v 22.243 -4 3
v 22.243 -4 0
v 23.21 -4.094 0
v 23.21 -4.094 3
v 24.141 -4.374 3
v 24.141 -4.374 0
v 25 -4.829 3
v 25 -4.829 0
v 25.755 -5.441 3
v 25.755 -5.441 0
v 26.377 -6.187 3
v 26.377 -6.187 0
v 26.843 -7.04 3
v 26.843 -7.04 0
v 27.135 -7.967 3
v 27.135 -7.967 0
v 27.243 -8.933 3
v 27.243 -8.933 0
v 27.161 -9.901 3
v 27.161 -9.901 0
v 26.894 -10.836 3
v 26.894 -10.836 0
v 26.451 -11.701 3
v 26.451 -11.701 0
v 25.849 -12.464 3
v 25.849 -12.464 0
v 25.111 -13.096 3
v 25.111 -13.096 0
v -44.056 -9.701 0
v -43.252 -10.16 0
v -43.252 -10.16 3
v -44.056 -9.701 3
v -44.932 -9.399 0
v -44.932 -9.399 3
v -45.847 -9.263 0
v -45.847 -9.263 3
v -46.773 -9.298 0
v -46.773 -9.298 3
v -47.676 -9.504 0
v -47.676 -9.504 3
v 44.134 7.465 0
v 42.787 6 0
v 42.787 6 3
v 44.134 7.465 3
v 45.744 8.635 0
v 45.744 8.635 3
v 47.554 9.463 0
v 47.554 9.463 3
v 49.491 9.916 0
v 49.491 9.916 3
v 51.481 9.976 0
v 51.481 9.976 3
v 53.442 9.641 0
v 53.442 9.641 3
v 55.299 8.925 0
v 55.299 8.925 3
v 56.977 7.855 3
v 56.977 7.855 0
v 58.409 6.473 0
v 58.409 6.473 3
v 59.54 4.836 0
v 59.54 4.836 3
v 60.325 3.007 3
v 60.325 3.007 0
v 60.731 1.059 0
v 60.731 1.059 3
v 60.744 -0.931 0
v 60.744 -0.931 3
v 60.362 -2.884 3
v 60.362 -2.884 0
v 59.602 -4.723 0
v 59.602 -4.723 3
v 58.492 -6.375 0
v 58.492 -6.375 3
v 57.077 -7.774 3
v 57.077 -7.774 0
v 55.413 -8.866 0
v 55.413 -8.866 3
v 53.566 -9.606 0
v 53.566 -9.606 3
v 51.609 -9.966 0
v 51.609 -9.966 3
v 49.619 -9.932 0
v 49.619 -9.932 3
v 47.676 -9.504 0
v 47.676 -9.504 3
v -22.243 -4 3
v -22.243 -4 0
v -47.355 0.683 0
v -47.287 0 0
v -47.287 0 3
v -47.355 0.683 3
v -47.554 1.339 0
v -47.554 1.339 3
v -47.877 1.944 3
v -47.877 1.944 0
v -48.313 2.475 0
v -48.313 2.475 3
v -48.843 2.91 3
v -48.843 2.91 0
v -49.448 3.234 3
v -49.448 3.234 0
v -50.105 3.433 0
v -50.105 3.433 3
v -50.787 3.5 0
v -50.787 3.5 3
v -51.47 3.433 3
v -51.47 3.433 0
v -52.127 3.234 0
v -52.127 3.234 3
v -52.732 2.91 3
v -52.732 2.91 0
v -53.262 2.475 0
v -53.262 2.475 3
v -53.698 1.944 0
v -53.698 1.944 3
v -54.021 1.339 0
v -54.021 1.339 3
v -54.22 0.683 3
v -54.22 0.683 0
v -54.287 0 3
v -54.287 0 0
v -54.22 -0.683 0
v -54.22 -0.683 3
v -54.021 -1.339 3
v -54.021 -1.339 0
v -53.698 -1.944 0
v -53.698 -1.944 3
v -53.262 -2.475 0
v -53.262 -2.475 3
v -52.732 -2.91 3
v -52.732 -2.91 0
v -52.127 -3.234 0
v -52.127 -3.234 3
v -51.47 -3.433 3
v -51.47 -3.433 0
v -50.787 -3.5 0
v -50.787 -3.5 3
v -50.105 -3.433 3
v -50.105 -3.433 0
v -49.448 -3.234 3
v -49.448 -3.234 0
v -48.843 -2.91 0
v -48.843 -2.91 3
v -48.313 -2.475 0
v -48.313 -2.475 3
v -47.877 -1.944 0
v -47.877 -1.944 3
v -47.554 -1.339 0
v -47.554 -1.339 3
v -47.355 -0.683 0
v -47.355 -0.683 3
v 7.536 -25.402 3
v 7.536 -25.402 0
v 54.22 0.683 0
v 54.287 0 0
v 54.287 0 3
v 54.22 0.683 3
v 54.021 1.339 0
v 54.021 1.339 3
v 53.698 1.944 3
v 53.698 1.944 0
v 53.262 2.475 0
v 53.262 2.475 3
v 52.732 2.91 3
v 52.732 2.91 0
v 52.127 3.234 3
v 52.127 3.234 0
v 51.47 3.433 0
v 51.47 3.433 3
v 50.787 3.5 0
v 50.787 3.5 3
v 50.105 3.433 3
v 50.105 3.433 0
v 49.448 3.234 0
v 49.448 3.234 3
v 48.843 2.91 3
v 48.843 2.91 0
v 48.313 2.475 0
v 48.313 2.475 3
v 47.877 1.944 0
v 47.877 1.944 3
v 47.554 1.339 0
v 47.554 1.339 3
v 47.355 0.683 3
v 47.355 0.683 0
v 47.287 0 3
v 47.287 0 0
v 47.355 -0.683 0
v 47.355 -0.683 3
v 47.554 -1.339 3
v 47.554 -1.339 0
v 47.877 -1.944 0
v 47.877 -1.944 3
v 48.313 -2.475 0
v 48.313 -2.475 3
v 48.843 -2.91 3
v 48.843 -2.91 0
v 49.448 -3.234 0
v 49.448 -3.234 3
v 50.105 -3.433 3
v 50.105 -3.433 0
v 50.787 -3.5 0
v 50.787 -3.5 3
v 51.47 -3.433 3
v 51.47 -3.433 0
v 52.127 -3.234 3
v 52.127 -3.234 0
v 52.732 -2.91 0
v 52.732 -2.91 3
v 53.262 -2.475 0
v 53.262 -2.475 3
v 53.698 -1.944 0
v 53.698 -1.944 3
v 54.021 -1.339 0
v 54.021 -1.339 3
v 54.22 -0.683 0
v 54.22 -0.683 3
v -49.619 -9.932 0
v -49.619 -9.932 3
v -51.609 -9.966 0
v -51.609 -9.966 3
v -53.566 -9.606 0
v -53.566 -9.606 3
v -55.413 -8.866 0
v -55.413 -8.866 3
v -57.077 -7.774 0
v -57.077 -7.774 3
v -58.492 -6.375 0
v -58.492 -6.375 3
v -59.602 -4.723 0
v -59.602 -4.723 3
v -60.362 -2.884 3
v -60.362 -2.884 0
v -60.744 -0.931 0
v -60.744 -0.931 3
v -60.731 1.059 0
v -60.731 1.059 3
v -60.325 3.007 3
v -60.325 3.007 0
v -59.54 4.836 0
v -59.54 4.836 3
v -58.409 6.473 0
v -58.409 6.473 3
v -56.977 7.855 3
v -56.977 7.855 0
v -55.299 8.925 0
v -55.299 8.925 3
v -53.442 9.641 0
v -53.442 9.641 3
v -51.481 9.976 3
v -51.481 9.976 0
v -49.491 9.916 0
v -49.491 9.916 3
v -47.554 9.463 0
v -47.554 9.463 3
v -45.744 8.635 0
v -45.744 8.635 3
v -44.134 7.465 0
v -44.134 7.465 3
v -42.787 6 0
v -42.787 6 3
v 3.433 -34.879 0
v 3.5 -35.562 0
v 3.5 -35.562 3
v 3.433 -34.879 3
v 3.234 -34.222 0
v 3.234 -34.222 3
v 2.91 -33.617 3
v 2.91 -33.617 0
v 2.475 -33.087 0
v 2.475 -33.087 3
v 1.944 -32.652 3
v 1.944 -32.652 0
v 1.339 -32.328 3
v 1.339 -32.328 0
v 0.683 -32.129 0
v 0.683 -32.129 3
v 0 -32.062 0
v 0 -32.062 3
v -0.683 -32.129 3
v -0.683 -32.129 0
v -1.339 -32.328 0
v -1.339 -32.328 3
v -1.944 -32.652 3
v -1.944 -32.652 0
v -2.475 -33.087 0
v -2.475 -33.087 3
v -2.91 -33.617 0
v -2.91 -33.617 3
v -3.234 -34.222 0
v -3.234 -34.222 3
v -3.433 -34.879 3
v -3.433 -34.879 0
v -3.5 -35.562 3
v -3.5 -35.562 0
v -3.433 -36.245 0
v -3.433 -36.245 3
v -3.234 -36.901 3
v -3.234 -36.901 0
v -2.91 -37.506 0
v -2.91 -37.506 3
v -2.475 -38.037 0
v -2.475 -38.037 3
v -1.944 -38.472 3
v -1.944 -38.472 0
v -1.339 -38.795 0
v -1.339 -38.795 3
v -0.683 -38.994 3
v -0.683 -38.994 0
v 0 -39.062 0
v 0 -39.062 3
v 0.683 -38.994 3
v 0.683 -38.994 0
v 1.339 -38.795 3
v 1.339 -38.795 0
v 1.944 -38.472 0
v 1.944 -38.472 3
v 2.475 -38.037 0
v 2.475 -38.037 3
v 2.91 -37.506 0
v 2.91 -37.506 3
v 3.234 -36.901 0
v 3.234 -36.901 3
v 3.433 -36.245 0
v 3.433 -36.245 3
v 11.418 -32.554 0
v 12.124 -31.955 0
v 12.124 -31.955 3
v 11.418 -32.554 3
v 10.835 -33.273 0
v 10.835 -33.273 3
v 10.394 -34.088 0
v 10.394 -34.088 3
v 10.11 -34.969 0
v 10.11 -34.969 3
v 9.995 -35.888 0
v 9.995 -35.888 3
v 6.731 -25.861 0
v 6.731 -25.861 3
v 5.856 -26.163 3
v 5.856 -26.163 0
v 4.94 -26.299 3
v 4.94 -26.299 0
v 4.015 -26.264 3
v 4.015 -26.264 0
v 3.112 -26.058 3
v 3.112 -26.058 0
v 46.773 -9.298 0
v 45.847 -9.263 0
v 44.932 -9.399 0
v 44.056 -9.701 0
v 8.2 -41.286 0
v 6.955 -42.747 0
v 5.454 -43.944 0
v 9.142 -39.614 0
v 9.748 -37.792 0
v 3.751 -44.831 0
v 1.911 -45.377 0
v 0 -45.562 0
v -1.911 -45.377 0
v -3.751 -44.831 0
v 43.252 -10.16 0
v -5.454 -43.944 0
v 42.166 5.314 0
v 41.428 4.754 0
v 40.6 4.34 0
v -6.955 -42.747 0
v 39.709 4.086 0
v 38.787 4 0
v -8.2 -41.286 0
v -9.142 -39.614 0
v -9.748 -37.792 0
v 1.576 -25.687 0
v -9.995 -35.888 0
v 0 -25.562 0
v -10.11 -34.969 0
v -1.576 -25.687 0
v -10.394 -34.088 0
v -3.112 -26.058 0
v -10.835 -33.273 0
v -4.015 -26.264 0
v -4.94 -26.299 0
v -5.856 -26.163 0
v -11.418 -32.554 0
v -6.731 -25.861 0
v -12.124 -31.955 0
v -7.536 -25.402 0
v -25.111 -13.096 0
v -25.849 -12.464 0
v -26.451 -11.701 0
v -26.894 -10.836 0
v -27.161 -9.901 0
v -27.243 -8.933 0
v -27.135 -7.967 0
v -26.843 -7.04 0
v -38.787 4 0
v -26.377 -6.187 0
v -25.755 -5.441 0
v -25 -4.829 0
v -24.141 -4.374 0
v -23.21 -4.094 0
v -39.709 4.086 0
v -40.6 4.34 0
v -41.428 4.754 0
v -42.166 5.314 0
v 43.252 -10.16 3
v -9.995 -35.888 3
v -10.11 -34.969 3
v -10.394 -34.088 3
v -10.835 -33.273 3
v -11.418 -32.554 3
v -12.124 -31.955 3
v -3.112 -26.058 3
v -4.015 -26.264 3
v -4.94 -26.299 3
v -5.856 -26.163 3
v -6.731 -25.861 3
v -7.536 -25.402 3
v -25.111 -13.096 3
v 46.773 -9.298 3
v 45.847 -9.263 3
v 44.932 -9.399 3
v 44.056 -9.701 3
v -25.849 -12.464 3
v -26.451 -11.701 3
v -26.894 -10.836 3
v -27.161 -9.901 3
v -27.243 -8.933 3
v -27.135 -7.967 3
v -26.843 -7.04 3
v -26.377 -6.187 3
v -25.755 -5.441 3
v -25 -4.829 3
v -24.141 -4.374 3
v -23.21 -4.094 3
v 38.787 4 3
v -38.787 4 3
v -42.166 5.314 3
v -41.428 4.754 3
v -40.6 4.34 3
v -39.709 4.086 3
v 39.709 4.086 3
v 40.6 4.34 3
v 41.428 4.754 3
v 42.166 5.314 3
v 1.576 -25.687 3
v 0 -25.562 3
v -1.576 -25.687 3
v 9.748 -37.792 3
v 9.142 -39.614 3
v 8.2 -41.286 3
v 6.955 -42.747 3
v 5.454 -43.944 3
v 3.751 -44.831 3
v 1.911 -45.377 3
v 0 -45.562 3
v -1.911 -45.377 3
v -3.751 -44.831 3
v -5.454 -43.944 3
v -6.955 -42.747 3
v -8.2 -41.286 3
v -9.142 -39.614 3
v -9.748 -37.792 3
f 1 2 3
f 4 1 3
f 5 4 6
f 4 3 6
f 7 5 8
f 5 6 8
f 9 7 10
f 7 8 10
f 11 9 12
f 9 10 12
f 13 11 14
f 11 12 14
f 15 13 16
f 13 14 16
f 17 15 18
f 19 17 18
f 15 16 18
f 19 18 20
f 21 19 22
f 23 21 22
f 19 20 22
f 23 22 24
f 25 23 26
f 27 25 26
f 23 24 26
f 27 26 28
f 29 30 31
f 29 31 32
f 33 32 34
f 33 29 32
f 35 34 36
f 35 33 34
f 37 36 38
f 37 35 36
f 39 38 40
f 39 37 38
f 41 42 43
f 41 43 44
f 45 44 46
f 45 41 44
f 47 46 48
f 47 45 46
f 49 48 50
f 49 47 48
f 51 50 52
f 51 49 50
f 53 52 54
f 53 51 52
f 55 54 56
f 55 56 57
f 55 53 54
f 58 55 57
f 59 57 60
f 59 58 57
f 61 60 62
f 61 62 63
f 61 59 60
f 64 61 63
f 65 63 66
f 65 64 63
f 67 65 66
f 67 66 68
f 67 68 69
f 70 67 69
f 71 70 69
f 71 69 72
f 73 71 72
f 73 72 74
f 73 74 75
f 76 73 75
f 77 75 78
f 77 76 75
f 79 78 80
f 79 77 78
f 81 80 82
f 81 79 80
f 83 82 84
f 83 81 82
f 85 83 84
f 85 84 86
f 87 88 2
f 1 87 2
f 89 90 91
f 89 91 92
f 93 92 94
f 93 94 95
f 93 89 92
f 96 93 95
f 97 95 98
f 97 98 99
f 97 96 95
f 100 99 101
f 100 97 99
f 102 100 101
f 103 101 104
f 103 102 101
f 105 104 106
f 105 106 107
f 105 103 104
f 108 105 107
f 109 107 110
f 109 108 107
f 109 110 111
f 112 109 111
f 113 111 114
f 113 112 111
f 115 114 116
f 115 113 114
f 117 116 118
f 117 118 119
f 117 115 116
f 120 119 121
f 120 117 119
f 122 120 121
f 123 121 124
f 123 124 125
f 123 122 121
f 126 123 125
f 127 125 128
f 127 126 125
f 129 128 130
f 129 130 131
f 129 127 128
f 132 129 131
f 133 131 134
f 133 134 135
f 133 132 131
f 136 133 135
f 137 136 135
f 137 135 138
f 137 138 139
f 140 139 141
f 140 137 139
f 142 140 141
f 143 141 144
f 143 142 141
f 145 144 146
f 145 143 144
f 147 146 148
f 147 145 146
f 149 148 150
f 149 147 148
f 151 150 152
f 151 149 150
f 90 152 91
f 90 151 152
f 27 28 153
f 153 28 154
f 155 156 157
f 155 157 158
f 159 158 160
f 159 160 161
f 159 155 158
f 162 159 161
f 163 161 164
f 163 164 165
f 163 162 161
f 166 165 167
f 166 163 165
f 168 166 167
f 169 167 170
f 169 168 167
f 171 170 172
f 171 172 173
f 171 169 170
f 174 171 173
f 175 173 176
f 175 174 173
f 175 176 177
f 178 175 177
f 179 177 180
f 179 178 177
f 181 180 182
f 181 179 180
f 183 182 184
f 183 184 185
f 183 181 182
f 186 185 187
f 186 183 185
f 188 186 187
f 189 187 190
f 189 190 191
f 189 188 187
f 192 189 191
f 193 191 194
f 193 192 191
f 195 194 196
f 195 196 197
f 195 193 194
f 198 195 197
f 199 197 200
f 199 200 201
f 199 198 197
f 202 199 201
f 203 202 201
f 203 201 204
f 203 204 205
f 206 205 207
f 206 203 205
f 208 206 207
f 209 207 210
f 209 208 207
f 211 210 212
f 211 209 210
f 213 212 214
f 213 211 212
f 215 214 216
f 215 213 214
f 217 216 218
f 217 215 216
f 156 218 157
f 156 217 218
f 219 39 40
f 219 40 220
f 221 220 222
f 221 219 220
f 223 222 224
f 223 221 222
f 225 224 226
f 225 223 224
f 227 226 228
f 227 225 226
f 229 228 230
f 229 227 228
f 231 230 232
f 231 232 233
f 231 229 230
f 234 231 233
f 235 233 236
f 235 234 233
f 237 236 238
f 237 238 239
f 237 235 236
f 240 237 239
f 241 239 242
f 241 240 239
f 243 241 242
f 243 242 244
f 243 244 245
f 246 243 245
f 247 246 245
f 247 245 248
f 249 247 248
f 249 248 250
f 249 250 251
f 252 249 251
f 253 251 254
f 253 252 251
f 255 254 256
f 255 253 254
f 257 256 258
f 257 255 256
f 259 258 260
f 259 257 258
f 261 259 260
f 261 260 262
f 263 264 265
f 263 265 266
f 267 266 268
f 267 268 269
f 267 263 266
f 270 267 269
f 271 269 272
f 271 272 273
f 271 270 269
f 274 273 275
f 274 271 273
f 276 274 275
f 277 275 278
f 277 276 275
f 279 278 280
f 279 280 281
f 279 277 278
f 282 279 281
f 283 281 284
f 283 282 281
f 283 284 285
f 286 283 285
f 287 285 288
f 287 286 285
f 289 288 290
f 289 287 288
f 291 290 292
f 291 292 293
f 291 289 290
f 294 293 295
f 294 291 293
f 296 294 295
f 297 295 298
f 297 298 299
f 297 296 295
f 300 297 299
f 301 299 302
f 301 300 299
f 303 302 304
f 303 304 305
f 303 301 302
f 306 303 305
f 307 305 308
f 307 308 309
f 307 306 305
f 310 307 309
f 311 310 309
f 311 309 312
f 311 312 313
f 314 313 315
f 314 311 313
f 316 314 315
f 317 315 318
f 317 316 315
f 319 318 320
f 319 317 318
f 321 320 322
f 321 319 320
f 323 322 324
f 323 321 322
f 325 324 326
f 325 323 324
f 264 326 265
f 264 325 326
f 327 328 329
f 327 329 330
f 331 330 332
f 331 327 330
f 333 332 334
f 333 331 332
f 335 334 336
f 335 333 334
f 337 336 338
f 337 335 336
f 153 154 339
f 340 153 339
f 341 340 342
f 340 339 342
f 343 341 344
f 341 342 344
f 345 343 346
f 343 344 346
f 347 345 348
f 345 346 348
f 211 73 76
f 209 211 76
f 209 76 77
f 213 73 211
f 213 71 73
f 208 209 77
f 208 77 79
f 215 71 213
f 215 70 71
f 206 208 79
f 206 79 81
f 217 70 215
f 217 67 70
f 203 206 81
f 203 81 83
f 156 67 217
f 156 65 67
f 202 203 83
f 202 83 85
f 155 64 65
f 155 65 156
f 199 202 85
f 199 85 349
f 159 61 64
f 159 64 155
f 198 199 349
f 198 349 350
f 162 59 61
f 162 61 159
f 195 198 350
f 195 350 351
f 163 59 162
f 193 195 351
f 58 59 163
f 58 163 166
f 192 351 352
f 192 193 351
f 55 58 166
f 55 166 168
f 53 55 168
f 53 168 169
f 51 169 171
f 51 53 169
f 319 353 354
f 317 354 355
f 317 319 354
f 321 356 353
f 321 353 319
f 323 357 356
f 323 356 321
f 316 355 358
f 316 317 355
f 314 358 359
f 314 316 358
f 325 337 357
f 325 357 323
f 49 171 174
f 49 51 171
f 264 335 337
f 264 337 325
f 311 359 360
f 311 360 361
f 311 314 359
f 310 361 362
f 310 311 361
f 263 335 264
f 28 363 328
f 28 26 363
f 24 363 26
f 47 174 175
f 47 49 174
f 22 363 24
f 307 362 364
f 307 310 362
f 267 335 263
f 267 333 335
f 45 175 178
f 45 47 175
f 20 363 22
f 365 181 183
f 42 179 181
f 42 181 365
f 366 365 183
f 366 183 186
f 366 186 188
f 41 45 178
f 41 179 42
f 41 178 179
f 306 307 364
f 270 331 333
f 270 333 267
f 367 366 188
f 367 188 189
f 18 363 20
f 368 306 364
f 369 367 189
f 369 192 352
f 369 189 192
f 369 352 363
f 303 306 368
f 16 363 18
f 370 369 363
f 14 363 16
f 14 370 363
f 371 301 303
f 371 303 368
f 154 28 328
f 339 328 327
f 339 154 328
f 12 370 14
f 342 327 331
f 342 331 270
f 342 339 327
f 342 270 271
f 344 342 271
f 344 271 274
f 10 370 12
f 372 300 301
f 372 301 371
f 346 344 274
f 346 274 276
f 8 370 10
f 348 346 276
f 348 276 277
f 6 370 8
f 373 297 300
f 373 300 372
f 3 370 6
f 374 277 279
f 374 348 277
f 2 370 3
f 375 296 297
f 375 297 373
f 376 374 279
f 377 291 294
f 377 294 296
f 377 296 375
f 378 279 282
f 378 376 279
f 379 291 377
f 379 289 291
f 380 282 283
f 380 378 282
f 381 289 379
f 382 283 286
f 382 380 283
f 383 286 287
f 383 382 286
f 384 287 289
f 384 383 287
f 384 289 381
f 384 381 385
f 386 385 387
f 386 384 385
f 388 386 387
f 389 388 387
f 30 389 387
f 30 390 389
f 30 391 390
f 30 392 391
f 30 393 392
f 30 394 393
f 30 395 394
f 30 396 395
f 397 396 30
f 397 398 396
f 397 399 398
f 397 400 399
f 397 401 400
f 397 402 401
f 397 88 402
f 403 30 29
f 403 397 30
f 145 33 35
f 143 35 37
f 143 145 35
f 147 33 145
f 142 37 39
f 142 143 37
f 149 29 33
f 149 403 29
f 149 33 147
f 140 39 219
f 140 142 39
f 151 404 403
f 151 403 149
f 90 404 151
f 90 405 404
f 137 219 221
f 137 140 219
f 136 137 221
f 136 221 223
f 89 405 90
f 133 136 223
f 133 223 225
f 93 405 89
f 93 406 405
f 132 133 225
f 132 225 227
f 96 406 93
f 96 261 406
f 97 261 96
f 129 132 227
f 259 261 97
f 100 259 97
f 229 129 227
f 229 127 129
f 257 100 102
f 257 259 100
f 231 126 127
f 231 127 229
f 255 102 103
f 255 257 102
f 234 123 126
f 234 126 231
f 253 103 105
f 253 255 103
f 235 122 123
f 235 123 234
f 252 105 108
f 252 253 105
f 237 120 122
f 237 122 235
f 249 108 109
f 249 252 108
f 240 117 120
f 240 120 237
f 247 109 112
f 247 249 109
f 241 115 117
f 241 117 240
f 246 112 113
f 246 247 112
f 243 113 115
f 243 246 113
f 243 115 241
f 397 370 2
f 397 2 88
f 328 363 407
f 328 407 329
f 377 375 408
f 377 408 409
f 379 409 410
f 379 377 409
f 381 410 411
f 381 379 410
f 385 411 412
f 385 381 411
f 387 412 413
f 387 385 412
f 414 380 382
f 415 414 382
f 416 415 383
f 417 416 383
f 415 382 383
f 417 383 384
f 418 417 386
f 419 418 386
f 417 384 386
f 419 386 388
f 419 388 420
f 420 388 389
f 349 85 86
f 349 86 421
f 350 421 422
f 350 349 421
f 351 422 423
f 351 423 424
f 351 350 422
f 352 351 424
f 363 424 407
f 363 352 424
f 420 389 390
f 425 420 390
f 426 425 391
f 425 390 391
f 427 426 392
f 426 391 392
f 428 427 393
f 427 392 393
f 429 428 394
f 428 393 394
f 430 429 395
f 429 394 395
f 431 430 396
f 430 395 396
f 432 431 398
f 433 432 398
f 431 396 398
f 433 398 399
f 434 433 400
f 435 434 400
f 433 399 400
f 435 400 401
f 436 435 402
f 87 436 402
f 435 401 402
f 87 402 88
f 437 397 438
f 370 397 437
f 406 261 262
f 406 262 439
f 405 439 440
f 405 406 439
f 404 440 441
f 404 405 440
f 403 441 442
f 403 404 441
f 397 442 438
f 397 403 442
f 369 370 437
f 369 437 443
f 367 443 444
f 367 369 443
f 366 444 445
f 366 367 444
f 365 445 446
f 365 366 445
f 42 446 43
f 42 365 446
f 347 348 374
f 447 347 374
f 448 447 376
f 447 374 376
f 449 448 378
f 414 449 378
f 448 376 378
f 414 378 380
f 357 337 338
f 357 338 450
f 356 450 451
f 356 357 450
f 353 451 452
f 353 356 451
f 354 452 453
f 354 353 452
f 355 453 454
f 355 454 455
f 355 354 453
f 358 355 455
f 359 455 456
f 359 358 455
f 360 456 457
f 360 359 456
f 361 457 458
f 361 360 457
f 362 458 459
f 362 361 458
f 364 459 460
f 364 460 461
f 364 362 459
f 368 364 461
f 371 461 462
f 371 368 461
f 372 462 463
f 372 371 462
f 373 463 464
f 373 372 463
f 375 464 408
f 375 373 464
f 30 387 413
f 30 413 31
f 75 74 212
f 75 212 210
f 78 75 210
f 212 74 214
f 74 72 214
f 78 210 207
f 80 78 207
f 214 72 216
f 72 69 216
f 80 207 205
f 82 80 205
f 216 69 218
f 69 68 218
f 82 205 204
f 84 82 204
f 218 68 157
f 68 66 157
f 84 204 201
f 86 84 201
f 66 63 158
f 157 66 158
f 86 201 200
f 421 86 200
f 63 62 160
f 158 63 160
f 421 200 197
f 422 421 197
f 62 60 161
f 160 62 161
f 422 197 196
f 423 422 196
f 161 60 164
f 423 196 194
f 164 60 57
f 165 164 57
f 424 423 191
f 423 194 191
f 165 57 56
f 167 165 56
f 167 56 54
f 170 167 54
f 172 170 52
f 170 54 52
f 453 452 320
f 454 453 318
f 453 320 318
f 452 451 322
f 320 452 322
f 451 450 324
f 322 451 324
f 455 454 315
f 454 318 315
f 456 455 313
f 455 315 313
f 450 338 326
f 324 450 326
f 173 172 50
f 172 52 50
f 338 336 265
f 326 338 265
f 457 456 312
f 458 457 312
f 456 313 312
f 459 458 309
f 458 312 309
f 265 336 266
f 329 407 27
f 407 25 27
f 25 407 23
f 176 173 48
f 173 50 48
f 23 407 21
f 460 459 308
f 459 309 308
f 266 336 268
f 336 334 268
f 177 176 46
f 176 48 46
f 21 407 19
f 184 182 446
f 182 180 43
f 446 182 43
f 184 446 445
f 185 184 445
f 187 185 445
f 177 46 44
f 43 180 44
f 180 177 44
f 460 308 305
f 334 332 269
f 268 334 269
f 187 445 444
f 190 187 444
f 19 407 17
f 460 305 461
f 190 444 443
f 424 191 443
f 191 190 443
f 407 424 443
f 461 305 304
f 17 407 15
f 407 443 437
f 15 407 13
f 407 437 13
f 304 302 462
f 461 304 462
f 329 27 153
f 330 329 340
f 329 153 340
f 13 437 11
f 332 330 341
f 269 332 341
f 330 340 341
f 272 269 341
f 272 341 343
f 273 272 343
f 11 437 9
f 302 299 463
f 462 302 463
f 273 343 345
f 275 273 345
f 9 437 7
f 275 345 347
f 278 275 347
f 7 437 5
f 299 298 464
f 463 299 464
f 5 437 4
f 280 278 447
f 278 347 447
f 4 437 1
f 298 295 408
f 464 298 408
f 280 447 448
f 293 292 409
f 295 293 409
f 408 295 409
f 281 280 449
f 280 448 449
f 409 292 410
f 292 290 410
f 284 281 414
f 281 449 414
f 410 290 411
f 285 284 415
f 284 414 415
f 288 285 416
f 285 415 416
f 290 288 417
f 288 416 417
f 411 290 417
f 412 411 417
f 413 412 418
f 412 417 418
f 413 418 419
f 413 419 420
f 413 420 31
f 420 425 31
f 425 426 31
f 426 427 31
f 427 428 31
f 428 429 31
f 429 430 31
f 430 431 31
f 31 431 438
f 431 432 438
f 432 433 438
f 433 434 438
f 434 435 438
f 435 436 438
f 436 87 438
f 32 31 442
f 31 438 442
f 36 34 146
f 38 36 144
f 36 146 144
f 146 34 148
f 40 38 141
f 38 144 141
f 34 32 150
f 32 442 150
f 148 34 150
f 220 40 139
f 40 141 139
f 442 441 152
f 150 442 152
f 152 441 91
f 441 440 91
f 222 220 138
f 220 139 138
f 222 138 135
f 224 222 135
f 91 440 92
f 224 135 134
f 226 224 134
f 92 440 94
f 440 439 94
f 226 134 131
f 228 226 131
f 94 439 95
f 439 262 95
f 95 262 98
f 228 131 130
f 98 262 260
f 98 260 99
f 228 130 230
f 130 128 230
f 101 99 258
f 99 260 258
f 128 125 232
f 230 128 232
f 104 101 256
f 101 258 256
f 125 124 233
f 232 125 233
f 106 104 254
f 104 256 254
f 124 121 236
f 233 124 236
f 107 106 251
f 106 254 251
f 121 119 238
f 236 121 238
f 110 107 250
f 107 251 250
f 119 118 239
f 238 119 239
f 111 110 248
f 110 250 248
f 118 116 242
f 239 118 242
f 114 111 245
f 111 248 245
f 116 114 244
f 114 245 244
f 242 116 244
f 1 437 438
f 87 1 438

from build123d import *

# Parameters (mm, degrees)
SKETCH_1_R      = 3.5
EXTRUDE_2_DEPTH = 3


with BuildPart() as part:
    # 草圖1 → 填料-伸長2 (new body)
    with BuildSketch(Plane.XY):
        with BuildLine():
            Line((43.25190796, -10.159525413), (12.124130277, -31.955429995))
            ThreePointArc((12.124130277, -31.955429995), (10.595221, -33.670386808), (9.994674972, -35.888039829))
            ThreePointArc((9.994674972, -35.888039829), (0, -45.561739054), (-9.994674972, -35.888039829))
            ThreePointArc((-9.994674972, -35.888039829), (-10.595221, -33.670386808), (-12.124130277, -31.955429995))
            Line((-12.124130277, -31.955429995), (-43.25190796, -10.159525413))
            ThreePointArc((-43.25190796, -10.159525413), (-45.386357993, -9.309370423), (-47.67566901, -9.503523757))
            ThreePointArc((-47.67566901, -9.503523757), (-60.324596253, 3.007057995), (-42.787426746, 6))
            ThreePointArc((-42.787426746, 6), (-41.023494723, 4.527864045), (-38.787426746, 4))
            Line((-38.787426746, 4), (38.787426746, 4))
            ThreePointArc((38.787426746, 4), (41.023494723, 4.527864045), (42.787426746, 6))
            ThreePointArc((42.787426746, 6), (60.324596253, 3.007057995), (47.67566901, -9.503523757))
            ThreePointArc((47.67566901, -9.503523757), (45.386357993, -9.309370423), (43.25190796, -10.159525413))
        make_face()
        with Locations((50.787426746, 0)):
            Circle(SKETCH_1_R, mode=Mode.SUBTRACT)
        with Locations((-50.787426746, 0)):
            Circle(SKETCH_1_R, mode=Mode.SUBTRACT)
        with Locations((0, -35.561739054)):
            Circle(SKETCH_1_R, mode=Mode.SUBTRACT)
        with BuildLine():
            Line((-22.243073525, -4), (22.243073525, -4))
            ThreePointArc((22.243073525, -4), (27.011658278, -7.496471002), (25.110955706, -13.095760221))
            Line((25.110955706, -13.095760221), (7.535518786, -25.40221364))
            ThreePointArc((7.535518786, -25.40221364), (5.401068753, -26.252368631), (3.111757736, -26.058215297))
            ThreePointArc((3.111757736, -26.058215297), (0, -25.561739054), (-3.111757736, -26.058215297))
            ThreePointArc((-3.111757736, -26.058215297), (-5.401068753, -26.252368631), (-7.535518786, -25.40221364))
            Line((-7.535518786, -25.40221364), (-25.110955706, -13.095760221))
            ThreePointArc((-25.110955706, -13.095760221), (-27.011658278, -7.496471002), (-22.243073525, -4))
        make_face(mode=Mode.SUBTRACT)
    extrude(amount=EXTRUDE_2_DEPTH)


solid = part.part
